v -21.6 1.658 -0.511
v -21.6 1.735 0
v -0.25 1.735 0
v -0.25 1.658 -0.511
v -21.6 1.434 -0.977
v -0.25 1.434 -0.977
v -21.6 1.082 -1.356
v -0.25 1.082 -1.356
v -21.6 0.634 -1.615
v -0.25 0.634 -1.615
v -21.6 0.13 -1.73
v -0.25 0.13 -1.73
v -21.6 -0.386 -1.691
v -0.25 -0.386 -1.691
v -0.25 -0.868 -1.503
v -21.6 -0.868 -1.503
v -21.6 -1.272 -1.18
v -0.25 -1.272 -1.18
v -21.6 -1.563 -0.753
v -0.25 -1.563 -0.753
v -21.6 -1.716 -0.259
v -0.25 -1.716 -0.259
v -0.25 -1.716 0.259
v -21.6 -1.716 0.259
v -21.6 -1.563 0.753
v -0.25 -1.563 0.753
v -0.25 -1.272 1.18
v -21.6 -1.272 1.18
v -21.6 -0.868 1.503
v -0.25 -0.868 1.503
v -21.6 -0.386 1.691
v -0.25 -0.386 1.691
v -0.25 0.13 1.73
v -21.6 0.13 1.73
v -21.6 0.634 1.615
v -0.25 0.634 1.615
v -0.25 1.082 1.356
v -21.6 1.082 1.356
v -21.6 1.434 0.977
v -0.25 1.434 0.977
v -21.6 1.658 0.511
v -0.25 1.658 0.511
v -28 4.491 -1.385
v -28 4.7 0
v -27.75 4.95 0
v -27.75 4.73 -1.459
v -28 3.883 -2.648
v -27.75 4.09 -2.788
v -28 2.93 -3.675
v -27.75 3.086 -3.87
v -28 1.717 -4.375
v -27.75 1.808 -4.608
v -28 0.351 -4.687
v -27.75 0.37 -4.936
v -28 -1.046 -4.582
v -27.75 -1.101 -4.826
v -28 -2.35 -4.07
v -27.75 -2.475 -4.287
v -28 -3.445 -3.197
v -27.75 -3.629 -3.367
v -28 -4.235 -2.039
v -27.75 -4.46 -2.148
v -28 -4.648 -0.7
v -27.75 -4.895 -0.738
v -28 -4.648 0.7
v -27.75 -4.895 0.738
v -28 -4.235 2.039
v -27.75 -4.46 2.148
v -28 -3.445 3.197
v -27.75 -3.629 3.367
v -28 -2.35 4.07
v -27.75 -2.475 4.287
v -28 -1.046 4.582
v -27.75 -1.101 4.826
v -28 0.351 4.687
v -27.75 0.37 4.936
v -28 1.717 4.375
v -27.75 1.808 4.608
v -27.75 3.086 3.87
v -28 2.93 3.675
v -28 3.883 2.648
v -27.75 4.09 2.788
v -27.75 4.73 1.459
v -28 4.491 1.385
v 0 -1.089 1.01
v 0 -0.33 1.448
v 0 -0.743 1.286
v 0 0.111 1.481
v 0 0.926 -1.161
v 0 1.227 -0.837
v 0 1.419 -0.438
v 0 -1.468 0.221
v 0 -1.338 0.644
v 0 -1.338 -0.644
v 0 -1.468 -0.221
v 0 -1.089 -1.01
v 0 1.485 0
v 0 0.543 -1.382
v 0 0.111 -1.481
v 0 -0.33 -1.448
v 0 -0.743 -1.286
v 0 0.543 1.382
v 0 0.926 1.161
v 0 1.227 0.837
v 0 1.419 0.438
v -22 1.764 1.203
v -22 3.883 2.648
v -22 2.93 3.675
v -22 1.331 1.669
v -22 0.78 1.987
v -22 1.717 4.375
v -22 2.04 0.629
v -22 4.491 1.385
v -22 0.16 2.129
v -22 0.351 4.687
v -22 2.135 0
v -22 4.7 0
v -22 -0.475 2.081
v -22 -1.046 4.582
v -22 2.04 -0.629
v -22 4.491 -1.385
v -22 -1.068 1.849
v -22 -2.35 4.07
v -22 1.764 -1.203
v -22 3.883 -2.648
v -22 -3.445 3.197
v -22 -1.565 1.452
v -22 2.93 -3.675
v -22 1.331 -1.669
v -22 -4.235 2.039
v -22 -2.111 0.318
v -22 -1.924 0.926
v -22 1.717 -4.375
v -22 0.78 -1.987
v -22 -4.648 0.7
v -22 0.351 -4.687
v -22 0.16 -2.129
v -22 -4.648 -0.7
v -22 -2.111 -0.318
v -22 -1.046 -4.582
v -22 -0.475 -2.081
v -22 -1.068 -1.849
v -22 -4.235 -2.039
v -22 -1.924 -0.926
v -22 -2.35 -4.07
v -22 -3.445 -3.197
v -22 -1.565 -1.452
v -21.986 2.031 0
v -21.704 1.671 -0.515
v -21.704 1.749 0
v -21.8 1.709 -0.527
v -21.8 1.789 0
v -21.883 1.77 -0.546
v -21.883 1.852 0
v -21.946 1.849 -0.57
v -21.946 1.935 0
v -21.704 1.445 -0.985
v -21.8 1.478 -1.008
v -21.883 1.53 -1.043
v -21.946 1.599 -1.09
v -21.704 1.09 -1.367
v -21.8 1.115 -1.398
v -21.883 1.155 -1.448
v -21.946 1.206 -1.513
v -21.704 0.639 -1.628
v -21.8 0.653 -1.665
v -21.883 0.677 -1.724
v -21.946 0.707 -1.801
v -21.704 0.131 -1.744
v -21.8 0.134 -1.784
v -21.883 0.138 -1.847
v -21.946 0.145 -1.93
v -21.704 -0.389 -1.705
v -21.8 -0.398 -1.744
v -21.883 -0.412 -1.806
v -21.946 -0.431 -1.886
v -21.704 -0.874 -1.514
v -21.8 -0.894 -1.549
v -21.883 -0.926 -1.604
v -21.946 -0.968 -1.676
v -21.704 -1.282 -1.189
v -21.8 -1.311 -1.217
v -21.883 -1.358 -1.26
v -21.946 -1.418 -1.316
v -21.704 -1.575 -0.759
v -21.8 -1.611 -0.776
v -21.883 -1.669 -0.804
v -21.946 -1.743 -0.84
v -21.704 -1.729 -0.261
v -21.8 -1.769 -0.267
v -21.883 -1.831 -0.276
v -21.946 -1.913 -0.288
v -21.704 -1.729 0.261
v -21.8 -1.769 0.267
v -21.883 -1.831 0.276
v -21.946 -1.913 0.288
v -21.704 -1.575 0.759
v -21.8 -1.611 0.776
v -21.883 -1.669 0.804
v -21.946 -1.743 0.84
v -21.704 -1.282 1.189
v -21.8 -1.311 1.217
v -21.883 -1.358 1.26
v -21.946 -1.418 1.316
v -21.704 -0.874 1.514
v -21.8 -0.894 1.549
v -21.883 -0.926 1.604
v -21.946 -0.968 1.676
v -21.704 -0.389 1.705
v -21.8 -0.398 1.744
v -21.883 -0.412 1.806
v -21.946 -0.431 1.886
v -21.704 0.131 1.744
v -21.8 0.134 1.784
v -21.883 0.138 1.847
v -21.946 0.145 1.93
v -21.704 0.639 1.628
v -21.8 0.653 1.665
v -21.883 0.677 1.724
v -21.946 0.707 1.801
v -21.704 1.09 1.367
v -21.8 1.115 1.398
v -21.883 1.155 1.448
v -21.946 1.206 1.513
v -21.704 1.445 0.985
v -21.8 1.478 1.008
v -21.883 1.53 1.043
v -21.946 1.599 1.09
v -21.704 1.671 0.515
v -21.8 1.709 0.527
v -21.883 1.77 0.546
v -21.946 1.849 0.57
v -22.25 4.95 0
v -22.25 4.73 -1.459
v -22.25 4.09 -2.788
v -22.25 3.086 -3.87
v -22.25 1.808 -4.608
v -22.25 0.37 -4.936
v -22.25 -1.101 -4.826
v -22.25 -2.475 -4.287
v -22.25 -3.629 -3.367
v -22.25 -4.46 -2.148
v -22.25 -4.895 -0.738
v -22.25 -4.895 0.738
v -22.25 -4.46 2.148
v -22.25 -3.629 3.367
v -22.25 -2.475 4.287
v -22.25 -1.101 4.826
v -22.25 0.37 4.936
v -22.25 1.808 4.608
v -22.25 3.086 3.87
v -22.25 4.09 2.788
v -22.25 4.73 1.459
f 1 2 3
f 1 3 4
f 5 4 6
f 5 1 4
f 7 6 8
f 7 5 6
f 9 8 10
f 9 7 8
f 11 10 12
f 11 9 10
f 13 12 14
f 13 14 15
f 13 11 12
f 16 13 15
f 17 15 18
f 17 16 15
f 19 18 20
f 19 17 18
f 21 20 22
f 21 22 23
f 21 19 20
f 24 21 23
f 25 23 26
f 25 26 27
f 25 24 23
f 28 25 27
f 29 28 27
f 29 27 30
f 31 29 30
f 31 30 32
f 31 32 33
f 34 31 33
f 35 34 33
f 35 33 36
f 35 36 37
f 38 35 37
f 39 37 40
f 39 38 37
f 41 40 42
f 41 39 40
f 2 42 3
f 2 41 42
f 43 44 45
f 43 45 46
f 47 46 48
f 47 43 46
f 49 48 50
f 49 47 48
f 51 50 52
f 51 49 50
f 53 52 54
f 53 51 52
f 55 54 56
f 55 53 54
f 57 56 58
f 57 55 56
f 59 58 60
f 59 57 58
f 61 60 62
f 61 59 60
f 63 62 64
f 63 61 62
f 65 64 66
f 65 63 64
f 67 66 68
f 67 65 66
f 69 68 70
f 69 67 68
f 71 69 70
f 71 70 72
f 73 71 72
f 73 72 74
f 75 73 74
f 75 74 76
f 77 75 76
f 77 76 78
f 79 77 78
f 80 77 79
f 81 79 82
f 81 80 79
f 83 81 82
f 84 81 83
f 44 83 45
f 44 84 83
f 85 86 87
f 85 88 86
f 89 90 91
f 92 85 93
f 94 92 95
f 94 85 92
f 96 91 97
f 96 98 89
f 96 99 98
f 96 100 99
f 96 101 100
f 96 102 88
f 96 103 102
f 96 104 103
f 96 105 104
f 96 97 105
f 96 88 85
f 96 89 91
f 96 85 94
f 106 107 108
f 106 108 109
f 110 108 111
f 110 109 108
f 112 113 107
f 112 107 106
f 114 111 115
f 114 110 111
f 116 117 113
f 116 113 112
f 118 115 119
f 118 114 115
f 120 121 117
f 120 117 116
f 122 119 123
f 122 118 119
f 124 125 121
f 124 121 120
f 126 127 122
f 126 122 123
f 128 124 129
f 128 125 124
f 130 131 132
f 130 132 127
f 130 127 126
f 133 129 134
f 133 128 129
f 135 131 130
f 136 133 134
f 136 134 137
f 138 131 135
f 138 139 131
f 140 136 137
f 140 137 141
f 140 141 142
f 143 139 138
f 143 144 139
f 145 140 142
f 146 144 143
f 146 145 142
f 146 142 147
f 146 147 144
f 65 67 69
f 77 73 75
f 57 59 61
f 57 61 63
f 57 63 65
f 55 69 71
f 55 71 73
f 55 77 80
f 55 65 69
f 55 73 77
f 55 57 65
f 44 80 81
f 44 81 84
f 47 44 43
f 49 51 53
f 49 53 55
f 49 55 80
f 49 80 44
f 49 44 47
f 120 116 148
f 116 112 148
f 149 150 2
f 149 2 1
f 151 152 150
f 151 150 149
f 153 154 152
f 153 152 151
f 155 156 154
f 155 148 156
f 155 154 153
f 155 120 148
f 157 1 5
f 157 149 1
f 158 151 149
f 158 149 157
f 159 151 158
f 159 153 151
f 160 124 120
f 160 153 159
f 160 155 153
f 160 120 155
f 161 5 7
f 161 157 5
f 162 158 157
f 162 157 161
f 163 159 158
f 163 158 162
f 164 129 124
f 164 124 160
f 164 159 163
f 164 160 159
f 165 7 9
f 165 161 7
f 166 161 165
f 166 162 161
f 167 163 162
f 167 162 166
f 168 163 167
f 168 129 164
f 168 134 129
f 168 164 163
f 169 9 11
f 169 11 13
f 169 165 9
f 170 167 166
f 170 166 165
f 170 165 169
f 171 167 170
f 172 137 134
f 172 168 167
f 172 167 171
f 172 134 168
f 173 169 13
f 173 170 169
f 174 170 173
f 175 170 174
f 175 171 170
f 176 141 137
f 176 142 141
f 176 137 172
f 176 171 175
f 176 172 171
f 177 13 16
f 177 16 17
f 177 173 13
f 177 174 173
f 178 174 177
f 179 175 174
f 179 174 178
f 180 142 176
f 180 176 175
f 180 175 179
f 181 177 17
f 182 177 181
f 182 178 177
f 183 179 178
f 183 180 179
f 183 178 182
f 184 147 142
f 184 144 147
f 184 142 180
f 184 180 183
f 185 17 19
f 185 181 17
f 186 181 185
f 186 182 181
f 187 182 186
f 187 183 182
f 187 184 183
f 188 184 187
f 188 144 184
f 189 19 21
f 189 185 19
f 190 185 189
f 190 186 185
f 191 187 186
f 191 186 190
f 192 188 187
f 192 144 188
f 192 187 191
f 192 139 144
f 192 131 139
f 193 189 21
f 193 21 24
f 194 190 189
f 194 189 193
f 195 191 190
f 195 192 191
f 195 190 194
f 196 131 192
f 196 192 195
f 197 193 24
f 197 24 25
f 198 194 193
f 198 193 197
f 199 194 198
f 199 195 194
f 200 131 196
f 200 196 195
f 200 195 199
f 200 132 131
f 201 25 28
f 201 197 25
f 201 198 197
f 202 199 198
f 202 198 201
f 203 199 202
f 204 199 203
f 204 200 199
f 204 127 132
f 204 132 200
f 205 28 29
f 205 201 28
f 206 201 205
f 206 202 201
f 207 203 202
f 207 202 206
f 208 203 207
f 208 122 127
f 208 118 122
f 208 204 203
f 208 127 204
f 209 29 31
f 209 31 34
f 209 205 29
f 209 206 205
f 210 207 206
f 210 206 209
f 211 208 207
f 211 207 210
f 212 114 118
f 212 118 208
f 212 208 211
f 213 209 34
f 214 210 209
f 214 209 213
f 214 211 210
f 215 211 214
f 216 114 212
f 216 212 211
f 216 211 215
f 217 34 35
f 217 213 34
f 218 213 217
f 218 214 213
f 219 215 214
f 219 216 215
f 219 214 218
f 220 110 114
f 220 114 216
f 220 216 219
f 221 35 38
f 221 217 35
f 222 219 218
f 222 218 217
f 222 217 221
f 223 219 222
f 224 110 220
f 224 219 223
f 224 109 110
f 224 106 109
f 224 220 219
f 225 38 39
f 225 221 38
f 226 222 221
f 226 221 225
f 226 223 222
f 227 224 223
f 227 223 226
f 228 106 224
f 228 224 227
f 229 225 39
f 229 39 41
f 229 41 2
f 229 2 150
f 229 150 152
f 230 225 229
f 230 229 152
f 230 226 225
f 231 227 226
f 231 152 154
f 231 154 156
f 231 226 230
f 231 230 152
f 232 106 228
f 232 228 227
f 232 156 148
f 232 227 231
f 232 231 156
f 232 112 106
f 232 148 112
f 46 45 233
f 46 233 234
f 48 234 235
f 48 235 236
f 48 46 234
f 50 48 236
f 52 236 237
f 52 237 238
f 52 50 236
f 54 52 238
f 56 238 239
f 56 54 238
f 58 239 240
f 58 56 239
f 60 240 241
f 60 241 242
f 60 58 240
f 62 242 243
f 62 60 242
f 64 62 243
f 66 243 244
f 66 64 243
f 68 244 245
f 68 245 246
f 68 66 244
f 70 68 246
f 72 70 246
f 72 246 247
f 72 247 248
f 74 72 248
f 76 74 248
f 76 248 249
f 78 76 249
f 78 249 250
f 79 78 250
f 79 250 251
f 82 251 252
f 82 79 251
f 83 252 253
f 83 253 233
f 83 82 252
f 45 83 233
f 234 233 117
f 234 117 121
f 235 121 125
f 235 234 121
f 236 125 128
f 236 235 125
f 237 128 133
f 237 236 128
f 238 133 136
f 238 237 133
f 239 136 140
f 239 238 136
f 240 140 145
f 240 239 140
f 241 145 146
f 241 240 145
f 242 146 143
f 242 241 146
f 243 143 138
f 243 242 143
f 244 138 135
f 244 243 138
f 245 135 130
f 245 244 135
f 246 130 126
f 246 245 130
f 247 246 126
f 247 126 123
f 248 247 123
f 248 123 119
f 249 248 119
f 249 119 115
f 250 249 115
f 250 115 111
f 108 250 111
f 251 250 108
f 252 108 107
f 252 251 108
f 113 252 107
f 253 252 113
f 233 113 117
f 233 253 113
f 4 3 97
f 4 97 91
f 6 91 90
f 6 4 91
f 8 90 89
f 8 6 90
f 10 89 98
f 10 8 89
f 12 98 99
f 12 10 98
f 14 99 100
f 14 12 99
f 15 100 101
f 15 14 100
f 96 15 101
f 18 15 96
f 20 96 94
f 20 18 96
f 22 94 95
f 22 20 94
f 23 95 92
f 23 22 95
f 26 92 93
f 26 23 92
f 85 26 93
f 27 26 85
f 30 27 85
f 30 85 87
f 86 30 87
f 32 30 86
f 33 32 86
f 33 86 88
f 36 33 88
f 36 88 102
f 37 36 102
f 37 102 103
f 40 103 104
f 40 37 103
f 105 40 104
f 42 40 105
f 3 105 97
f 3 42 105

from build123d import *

# Parameters (mm, degrees)
CHAMFER1_SIZE = 0.25
FILLET1_R     = 0.4


with BuildPart() as part:
    # Sketch1 → Revolve1 (revolve)
    with BuildSketch(Plane.XY):
        Polygon((0, 0), (0, 1.735), (-22, 1.735), (-22, 4.95), (-28, 4.95), (-28, 0), align=None)
    revolve(axis=Axis((0, 0, 0), (-1, 0, 0)))

    # Chamfer1
    chamfer1_edges = [part.edges().sort_by_distance(p)[0] for p in [
        (0, -1.735, 0),
        (-22, -4.95, 0),
        (-28, -4.95, 0),
    ]]
    chamfer(chamfer1_edges, length=CHAMFER1_SIZE)

    # Fillet1
    fillet1_edges = [part.edges().sort_by_distance(p)[0] for p in [
        (-22, -1.735, 0),
    ]]
    fillet(fillet1_edges, radius=FILLET1_R)


solid = part.part
